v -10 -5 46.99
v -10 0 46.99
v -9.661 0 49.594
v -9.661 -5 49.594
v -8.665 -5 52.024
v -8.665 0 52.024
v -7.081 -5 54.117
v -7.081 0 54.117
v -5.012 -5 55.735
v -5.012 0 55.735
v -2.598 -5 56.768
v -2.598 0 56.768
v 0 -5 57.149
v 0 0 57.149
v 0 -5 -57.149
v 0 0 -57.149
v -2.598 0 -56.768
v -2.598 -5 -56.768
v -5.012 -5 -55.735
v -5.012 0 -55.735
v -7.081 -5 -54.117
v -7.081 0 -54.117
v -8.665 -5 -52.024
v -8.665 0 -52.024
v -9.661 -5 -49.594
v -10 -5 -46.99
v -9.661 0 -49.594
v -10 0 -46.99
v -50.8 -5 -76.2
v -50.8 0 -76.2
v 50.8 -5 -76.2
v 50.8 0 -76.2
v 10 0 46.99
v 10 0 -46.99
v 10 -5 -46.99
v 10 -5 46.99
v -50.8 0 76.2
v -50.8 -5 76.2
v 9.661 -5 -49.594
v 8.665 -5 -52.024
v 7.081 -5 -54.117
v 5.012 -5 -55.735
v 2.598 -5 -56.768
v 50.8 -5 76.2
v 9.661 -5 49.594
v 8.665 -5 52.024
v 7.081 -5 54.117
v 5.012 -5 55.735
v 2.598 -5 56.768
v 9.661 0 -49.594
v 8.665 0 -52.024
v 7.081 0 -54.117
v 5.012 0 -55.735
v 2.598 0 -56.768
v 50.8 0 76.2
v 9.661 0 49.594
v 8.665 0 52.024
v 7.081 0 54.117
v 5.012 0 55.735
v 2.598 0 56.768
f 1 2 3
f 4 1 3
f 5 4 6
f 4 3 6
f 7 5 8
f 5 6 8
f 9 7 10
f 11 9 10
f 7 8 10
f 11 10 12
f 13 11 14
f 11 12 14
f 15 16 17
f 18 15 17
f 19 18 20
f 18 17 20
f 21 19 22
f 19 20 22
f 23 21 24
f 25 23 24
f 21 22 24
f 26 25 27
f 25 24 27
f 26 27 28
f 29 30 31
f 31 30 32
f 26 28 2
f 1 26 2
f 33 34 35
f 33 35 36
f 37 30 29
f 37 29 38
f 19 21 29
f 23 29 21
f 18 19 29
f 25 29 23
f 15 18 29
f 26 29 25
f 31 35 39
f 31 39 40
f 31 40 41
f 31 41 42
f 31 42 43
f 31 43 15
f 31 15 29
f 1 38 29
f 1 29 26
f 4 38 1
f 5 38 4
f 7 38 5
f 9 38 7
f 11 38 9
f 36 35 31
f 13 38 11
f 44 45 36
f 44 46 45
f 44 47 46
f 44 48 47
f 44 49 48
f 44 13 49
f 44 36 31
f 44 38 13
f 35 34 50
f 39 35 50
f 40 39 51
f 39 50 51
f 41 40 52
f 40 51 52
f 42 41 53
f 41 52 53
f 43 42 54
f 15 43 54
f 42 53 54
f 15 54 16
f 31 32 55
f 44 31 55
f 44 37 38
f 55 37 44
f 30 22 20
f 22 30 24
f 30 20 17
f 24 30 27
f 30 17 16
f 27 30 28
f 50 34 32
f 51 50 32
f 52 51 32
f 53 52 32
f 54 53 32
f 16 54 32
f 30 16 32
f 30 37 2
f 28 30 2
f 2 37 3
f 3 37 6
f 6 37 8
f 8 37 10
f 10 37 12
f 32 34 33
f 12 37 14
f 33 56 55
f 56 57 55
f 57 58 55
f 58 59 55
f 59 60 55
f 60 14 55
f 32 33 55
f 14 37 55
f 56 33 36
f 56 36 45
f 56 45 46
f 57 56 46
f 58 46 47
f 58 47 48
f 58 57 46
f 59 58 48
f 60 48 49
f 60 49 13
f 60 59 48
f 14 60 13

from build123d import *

# Parameters (mm, degrees)
F0_W        = 101.6
F0_H        = 152.4
F0_W_2      = 20
F0_H_2      = 114.3
F1_DEPTH    = 5
F2_T1_DEPTH = 5


# Not quite as in the source:
# - a fillet or chamfer that OpenCascade refuses, or shapes differently, is made with other operations: its cross-section is extruded or revolved along the edge and cut away or added


with BuildPart() as f1:
    # F0 (on Front) → F1 (new body)
    with BuildSketch(Plane.XZ):
        Rectangle(F0_W, F0_H)
        Rectangle(F0_W_2, F0_H_2, mode=Mode.SUBTRACT)
    extrude(amount=F1_DEPTH)

    # F2: fillet of radius 10.16 on 4 edges, made by hand

    # F2_s2 → F2_t1 (join)
    with BuildSketch(Plane.XZ):
        with BuildLine():
            ThreePointArc((-10, 46.99), (-7.0242048969, 54.1742048969), (0.16, 57.15))
            Line((0.16, 57.15), (-10, 57.15))
            Line((-10, 57.15), (-10, 46.99))
        make_face()
        with BuildLine():
            ThreePointArc((10, 46.99), (7.0242048969, 54.1742048969), (-0.16, 57.15))
            Line((-0.16, 57.15), (10, 57.15))
            Line((10, 57.15), (10, 46.99))
        make_face()
        with BuildLine():
            ThreePointArc((10, -46.99), (7.0242048969, -54.1742048969), (-0.16, -57.15))
            Line((-0.16, -57.15), (10, -57.15))
            Line((10, -57.15), (10, -46.99))
        make_face()
        with BuildLine():
            ThreePointArc((0.16, -57.15), (-7.0242048969, -54.1742048969), (-10, -46.99))
            Line((-10, -46.99), (-10, -57.15))
            Line((-10, -57.15), (0.16, -57.15))
        make_face()
    extrude(amount=F2_T1_DEPTH)


solid = f1.part
